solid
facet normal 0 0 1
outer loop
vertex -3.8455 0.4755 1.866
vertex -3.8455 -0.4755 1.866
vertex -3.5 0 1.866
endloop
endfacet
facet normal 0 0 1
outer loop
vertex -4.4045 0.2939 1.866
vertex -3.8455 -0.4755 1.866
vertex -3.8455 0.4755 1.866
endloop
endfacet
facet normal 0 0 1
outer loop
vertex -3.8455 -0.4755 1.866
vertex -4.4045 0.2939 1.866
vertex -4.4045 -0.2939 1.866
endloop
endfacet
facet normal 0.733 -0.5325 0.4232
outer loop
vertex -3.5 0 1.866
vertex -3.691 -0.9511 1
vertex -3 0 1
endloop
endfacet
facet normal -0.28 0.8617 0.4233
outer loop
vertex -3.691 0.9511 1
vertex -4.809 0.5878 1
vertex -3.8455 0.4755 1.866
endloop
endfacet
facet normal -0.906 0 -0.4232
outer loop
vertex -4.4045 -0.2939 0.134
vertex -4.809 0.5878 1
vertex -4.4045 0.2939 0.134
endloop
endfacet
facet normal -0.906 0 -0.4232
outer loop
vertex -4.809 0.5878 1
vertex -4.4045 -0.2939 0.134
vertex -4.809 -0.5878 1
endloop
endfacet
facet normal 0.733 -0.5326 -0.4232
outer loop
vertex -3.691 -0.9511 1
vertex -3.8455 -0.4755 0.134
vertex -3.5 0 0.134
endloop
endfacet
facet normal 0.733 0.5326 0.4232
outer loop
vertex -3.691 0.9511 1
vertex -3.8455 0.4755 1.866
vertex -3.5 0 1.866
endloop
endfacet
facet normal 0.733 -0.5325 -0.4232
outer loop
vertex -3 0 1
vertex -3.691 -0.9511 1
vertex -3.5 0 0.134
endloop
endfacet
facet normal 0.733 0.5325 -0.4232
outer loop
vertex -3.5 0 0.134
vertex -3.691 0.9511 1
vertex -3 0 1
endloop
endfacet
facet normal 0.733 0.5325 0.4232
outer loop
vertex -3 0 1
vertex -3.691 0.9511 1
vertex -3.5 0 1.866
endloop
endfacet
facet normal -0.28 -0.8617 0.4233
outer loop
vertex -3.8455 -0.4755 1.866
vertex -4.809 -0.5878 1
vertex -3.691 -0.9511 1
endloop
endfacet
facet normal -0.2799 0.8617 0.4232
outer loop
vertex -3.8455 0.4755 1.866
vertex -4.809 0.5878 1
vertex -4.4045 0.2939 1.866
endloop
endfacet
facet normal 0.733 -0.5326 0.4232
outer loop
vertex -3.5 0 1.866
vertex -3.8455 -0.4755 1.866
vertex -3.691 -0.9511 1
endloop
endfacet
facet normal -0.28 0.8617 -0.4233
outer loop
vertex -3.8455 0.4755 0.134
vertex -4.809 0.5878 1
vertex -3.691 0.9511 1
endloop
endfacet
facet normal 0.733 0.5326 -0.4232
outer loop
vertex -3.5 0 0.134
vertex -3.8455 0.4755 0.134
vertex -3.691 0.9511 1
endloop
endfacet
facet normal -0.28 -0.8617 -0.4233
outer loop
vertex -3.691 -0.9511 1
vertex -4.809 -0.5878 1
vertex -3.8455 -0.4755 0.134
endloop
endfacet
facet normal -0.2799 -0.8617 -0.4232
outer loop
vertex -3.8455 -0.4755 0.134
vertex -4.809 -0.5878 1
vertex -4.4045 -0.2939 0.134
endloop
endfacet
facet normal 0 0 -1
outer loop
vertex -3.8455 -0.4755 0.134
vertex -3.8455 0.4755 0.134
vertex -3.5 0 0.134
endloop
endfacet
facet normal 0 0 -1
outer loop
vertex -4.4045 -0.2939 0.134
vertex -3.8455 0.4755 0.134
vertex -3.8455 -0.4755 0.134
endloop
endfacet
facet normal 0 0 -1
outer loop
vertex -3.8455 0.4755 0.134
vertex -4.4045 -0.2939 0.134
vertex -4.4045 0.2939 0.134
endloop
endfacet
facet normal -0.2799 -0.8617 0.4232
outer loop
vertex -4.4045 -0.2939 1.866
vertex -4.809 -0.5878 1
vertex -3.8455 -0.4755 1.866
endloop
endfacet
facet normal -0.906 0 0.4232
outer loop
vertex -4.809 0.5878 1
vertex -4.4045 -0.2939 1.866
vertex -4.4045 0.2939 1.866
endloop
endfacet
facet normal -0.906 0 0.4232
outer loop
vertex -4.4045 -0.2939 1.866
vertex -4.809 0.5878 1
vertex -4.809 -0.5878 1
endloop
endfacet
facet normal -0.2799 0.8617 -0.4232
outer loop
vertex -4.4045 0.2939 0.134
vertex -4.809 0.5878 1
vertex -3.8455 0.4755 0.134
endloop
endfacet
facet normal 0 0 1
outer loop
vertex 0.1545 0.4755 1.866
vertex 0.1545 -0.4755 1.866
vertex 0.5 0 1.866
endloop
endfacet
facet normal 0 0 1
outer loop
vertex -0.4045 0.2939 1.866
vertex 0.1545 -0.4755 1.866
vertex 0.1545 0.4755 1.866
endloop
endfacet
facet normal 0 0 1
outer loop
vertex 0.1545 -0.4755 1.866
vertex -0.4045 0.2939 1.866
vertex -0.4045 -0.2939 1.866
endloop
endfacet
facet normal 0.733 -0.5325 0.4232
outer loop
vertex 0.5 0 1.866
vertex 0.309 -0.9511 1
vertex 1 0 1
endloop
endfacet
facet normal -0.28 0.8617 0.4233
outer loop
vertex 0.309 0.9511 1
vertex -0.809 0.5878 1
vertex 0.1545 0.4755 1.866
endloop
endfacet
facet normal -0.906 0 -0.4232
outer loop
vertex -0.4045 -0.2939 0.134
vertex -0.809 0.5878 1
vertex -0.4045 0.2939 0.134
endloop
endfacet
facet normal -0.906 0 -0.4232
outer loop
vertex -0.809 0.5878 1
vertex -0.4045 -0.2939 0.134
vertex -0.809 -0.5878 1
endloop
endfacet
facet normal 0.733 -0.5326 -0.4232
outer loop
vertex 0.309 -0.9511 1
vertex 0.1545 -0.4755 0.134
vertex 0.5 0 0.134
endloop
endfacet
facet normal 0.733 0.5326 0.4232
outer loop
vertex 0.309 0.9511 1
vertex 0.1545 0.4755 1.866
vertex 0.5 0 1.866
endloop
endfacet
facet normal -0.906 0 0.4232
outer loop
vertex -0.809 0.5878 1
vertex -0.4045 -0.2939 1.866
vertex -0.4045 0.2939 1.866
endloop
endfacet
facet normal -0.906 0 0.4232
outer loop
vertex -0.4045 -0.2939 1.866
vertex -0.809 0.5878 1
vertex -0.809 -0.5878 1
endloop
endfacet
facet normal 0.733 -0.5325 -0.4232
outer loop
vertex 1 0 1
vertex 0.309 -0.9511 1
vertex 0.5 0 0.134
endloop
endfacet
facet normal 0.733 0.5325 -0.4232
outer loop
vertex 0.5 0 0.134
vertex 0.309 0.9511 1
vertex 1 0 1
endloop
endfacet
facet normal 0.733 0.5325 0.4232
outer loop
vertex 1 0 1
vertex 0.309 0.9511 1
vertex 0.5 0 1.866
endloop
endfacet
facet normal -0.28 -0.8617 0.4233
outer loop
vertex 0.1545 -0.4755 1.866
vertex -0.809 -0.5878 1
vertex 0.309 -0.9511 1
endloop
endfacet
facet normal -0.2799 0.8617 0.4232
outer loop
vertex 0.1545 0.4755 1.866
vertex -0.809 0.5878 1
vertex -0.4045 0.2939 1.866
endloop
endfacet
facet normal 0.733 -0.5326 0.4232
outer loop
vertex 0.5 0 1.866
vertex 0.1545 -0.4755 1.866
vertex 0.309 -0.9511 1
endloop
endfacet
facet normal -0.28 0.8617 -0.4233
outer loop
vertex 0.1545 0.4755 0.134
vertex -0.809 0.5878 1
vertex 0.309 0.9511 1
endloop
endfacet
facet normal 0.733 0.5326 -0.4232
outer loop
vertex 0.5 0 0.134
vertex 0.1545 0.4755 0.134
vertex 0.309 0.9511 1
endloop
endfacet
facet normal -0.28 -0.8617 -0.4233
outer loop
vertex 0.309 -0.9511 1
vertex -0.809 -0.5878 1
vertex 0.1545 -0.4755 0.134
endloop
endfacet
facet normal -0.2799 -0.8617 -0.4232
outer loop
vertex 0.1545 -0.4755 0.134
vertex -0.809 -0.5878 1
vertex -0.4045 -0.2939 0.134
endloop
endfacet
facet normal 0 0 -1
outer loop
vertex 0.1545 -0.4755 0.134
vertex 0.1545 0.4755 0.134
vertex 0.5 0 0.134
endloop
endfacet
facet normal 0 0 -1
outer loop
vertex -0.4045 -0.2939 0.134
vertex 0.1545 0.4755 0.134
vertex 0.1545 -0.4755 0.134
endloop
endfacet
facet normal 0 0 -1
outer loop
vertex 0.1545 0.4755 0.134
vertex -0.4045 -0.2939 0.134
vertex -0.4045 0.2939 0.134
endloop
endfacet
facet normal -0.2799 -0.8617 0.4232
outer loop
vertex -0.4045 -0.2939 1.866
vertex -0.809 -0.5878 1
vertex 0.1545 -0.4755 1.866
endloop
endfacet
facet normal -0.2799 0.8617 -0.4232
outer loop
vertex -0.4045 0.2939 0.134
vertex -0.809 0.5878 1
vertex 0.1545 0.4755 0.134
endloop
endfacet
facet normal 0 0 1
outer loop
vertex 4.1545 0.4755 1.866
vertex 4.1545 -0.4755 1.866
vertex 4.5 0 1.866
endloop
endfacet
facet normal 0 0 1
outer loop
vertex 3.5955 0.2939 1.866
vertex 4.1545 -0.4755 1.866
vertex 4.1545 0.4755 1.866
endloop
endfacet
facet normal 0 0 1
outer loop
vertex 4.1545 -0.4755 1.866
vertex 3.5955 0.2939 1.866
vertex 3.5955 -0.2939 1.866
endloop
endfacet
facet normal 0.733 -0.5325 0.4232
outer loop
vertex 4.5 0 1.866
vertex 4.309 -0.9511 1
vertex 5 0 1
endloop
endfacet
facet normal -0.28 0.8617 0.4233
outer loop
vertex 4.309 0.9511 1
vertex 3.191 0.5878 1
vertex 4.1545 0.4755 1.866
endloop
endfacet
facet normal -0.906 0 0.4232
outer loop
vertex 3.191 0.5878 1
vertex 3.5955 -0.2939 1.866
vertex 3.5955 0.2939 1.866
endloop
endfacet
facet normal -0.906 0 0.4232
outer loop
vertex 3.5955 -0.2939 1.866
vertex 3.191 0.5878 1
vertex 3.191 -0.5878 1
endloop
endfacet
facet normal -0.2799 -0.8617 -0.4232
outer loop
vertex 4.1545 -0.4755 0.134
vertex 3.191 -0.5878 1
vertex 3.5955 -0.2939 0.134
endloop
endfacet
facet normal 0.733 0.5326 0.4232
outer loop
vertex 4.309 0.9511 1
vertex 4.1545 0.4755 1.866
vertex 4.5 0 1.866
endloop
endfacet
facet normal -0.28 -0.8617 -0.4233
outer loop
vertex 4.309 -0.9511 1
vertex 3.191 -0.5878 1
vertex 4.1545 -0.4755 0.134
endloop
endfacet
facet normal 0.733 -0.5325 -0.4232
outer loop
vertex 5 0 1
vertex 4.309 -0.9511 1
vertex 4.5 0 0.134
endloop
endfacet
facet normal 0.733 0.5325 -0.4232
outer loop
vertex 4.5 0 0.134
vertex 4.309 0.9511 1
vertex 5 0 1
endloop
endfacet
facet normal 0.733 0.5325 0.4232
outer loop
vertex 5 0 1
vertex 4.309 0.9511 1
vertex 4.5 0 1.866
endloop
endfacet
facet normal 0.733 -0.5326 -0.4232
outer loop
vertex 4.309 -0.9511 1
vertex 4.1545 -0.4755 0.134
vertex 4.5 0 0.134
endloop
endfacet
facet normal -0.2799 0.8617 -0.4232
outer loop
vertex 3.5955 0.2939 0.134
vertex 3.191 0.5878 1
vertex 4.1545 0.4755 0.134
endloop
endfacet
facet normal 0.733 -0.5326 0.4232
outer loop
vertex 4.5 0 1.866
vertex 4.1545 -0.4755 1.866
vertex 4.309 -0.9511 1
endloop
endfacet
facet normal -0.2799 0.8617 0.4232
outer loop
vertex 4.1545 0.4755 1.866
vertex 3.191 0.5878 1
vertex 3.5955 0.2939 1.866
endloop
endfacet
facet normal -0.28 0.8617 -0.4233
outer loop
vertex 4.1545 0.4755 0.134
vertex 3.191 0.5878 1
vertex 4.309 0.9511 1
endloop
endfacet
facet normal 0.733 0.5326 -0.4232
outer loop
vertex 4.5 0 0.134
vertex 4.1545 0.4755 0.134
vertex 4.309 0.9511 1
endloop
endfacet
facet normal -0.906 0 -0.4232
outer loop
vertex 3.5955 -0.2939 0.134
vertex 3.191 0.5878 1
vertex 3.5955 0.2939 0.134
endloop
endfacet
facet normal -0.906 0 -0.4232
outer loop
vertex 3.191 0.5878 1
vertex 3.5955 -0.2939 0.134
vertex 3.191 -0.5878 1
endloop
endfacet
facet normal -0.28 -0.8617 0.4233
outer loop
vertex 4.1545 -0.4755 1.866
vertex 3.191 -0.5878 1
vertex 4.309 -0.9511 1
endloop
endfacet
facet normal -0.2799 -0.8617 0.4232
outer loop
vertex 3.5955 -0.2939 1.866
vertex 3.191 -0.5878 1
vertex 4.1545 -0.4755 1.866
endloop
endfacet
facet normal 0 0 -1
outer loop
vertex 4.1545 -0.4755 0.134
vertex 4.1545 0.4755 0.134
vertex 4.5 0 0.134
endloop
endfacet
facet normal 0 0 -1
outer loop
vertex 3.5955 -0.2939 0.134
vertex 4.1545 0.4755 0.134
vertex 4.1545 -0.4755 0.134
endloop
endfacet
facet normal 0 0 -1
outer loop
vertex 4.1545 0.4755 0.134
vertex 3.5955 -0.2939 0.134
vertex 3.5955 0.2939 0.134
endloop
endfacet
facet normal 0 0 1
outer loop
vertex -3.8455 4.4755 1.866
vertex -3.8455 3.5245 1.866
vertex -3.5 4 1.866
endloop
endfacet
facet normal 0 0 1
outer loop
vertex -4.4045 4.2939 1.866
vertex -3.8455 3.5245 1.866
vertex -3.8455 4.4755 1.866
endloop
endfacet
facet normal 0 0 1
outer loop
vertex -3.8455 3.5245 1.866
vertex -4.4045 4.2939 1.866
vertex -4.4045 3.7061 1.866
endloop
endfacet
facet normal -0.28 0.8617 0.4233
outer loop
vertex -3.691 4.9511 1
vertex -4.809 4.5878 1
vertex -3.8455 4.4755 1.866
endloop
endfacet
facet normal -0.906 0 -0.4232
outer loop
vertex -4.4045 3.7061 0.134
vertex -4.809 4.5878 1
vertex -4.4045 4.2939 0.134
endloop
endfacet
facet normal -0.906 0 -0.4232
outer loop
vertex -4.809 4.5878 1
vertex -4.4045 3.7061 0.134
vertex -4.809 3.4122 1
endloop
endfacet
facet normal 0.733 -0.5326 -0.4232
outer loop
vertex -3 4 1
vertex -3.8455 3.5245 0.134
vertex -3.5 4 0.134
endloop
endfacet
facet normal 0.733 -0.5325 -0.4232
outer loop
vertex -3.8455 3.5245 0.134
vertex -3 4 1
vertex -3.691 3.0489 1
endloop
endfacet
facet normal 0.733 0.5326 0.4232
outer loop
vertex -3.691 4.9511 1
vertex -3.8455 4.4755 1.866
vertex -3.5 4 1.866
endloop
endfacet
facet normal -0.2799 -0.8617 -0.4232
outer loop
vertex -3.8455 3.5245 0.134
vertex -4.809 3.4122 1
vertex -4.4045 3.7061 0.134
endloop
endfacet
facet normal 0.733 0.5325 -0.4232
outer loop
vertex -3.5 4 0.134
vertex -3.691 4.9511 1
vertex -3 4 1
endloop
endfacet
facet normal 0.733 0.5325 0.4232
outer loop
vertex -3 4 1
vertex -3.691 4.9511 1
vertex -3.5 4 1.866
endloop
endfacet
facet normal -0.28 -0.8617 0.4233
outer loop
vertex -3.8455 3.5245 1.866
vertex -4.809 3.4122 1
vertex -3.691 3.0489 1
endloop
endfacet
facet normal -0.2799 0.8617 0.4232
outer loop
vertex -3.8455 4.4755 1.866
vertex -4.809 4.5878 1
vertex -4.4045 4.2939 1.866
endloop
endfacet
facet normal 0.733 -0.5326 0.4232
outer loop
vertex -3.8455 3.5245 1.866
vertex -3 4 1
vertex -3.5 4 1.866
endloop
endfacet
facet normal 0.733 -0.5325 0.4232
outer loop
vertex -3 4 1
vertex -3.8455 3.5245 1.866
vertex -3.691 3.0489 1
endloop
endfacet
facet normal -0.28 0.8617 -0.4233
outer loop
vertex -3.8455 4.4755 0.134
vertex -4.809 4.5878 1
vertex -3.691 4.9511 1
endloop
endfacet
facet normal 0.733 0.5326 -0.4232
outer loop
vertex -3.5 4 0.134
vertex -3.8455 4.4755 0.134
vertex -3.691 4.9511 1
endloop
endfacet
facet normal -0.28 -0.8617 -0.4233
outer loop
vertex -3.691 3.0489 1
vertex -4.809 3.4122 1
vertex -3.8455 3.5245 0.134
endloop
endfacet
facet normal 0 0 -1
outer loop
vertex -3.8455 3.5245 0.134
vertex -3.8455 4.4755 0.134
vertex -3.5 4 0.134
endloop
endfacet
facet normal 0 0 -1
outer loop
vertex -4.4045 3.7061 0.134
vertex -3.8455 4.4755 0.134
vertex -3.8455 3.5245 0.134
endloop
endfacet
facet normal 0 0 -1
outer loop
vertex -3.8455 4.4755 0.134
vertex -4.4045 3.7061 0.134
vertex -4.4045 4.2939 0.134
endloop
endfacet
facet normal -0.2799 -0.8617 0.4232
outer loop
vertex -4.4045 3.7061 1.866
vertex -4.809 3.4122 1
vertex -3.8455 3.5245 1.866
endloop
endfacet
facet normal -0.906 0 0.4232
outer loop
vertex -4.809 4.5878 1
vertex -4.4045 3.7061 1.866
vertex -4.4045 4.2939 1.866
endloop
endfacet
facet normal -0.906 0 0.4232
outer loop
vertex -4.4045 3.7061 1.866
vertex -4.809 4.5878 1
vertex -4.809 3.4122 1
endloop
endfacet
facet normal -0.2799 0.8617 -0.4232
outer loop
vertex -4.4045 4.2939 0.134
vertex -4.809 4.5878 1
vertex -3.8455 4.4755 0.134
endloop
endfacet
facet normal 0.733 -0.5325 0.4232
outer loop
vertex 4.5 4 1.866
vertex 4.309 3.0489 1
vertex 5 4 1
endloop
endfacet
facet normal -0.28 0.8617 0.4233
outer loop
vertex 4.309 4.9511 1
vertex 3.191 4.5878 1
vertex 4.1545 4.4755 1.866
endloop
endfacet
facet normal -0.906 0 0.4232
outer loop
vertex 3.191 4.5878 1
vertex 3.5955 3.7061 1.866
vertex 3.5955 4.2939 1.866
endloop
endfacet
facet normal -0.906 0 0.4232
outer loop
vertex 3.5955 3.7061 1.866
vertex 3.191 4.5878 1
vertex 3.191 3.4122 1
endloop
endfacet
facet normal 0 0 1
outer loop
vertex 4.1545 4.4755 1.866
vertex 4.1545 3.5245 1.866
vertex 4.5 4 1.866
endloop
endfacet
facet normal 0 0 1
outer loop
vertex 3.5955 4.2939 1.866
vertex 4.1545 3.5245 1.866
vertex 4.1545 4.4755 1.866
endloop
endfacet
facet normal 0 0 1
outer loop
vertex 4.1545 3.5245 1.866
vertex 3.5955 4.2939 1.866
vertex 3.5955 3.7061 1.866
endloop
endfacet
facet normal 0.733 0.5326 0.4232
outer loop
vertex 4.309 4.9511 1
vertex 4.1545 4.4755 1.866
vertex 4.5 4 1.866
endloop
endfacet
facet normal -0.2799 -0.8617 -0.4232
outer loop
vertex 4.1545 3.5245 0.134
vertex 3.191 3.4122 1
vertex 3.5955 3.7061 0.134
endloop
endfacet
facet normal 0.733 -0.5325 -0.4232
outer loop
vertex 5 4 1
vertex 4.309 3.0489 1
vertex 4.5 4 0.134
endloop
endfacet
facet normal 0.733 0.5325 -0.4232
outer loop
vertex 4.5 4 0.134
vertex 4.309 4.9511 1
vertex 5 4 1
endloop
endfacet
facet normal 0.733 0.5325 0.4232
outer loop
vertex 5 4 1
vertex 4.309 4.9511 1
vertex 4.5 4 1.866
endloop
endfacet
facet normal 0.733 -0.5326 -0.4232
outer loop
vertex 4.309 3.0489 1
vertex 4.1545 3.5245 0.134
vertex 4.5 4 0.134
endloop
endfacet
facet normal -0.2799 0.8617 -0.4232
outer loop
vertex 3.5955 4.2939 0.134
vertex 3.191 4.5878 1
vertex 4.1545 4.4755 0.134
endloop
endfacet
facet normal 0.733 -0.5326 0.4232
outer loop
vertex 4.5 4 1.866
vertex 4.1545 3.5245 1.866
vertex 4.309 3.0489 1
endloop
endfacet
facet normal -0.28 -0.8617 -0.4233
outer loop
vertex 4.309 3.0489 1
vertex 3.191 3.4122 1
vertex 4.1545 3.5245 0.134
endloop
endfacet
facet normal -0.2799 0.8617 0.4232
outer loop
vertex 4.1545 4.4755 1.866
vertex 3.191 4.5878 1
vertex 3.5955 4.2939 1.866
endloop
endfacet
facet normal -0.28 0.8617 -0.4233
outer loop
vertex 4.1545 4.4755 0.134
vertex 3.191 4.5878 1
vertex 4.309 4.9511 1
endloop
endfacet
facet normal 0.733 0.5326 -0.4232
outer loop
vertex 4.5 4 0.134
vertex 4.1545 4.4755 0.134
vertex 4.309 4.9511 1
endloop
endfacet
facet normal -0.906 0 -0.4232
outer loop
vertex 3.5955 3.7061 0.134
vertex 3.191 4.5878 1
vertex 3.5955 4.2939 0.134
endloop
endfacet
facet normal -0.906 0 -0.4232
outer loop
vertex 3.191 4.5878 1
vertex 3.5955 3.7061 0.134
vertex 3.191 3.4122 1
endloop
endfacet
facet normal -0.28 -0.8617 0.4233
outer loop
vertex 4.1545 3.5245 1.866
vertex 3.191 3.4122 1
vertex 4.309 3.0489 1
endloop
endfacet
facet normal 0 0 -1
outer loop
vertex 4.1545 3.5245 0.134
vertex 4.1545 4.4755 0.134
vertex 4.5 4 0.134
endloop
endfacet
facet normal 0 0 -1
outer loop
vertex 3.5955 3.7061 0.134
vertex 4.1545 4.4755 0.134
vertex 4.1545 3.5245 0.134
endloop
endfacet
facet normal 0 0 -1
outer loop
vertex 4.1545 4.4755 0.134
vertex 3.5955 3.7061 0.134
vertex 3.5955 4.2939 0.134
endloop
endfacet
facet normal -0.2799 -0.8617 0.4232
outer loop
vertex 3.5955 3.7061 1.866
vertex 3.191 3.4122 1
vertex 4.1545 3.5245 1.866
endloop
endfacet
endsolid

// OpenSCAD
union() {
	translate([-4, 0, 1]) sphere(r=1);
	translate([0, 0, 1]) sphere(r=1);
	translate([4, 0, 1]) sphere(r=1);
	translate([-4, 4, 1]) sphere(r=1);
	translate([4, 4, 1]) sphere(r=1);
}
